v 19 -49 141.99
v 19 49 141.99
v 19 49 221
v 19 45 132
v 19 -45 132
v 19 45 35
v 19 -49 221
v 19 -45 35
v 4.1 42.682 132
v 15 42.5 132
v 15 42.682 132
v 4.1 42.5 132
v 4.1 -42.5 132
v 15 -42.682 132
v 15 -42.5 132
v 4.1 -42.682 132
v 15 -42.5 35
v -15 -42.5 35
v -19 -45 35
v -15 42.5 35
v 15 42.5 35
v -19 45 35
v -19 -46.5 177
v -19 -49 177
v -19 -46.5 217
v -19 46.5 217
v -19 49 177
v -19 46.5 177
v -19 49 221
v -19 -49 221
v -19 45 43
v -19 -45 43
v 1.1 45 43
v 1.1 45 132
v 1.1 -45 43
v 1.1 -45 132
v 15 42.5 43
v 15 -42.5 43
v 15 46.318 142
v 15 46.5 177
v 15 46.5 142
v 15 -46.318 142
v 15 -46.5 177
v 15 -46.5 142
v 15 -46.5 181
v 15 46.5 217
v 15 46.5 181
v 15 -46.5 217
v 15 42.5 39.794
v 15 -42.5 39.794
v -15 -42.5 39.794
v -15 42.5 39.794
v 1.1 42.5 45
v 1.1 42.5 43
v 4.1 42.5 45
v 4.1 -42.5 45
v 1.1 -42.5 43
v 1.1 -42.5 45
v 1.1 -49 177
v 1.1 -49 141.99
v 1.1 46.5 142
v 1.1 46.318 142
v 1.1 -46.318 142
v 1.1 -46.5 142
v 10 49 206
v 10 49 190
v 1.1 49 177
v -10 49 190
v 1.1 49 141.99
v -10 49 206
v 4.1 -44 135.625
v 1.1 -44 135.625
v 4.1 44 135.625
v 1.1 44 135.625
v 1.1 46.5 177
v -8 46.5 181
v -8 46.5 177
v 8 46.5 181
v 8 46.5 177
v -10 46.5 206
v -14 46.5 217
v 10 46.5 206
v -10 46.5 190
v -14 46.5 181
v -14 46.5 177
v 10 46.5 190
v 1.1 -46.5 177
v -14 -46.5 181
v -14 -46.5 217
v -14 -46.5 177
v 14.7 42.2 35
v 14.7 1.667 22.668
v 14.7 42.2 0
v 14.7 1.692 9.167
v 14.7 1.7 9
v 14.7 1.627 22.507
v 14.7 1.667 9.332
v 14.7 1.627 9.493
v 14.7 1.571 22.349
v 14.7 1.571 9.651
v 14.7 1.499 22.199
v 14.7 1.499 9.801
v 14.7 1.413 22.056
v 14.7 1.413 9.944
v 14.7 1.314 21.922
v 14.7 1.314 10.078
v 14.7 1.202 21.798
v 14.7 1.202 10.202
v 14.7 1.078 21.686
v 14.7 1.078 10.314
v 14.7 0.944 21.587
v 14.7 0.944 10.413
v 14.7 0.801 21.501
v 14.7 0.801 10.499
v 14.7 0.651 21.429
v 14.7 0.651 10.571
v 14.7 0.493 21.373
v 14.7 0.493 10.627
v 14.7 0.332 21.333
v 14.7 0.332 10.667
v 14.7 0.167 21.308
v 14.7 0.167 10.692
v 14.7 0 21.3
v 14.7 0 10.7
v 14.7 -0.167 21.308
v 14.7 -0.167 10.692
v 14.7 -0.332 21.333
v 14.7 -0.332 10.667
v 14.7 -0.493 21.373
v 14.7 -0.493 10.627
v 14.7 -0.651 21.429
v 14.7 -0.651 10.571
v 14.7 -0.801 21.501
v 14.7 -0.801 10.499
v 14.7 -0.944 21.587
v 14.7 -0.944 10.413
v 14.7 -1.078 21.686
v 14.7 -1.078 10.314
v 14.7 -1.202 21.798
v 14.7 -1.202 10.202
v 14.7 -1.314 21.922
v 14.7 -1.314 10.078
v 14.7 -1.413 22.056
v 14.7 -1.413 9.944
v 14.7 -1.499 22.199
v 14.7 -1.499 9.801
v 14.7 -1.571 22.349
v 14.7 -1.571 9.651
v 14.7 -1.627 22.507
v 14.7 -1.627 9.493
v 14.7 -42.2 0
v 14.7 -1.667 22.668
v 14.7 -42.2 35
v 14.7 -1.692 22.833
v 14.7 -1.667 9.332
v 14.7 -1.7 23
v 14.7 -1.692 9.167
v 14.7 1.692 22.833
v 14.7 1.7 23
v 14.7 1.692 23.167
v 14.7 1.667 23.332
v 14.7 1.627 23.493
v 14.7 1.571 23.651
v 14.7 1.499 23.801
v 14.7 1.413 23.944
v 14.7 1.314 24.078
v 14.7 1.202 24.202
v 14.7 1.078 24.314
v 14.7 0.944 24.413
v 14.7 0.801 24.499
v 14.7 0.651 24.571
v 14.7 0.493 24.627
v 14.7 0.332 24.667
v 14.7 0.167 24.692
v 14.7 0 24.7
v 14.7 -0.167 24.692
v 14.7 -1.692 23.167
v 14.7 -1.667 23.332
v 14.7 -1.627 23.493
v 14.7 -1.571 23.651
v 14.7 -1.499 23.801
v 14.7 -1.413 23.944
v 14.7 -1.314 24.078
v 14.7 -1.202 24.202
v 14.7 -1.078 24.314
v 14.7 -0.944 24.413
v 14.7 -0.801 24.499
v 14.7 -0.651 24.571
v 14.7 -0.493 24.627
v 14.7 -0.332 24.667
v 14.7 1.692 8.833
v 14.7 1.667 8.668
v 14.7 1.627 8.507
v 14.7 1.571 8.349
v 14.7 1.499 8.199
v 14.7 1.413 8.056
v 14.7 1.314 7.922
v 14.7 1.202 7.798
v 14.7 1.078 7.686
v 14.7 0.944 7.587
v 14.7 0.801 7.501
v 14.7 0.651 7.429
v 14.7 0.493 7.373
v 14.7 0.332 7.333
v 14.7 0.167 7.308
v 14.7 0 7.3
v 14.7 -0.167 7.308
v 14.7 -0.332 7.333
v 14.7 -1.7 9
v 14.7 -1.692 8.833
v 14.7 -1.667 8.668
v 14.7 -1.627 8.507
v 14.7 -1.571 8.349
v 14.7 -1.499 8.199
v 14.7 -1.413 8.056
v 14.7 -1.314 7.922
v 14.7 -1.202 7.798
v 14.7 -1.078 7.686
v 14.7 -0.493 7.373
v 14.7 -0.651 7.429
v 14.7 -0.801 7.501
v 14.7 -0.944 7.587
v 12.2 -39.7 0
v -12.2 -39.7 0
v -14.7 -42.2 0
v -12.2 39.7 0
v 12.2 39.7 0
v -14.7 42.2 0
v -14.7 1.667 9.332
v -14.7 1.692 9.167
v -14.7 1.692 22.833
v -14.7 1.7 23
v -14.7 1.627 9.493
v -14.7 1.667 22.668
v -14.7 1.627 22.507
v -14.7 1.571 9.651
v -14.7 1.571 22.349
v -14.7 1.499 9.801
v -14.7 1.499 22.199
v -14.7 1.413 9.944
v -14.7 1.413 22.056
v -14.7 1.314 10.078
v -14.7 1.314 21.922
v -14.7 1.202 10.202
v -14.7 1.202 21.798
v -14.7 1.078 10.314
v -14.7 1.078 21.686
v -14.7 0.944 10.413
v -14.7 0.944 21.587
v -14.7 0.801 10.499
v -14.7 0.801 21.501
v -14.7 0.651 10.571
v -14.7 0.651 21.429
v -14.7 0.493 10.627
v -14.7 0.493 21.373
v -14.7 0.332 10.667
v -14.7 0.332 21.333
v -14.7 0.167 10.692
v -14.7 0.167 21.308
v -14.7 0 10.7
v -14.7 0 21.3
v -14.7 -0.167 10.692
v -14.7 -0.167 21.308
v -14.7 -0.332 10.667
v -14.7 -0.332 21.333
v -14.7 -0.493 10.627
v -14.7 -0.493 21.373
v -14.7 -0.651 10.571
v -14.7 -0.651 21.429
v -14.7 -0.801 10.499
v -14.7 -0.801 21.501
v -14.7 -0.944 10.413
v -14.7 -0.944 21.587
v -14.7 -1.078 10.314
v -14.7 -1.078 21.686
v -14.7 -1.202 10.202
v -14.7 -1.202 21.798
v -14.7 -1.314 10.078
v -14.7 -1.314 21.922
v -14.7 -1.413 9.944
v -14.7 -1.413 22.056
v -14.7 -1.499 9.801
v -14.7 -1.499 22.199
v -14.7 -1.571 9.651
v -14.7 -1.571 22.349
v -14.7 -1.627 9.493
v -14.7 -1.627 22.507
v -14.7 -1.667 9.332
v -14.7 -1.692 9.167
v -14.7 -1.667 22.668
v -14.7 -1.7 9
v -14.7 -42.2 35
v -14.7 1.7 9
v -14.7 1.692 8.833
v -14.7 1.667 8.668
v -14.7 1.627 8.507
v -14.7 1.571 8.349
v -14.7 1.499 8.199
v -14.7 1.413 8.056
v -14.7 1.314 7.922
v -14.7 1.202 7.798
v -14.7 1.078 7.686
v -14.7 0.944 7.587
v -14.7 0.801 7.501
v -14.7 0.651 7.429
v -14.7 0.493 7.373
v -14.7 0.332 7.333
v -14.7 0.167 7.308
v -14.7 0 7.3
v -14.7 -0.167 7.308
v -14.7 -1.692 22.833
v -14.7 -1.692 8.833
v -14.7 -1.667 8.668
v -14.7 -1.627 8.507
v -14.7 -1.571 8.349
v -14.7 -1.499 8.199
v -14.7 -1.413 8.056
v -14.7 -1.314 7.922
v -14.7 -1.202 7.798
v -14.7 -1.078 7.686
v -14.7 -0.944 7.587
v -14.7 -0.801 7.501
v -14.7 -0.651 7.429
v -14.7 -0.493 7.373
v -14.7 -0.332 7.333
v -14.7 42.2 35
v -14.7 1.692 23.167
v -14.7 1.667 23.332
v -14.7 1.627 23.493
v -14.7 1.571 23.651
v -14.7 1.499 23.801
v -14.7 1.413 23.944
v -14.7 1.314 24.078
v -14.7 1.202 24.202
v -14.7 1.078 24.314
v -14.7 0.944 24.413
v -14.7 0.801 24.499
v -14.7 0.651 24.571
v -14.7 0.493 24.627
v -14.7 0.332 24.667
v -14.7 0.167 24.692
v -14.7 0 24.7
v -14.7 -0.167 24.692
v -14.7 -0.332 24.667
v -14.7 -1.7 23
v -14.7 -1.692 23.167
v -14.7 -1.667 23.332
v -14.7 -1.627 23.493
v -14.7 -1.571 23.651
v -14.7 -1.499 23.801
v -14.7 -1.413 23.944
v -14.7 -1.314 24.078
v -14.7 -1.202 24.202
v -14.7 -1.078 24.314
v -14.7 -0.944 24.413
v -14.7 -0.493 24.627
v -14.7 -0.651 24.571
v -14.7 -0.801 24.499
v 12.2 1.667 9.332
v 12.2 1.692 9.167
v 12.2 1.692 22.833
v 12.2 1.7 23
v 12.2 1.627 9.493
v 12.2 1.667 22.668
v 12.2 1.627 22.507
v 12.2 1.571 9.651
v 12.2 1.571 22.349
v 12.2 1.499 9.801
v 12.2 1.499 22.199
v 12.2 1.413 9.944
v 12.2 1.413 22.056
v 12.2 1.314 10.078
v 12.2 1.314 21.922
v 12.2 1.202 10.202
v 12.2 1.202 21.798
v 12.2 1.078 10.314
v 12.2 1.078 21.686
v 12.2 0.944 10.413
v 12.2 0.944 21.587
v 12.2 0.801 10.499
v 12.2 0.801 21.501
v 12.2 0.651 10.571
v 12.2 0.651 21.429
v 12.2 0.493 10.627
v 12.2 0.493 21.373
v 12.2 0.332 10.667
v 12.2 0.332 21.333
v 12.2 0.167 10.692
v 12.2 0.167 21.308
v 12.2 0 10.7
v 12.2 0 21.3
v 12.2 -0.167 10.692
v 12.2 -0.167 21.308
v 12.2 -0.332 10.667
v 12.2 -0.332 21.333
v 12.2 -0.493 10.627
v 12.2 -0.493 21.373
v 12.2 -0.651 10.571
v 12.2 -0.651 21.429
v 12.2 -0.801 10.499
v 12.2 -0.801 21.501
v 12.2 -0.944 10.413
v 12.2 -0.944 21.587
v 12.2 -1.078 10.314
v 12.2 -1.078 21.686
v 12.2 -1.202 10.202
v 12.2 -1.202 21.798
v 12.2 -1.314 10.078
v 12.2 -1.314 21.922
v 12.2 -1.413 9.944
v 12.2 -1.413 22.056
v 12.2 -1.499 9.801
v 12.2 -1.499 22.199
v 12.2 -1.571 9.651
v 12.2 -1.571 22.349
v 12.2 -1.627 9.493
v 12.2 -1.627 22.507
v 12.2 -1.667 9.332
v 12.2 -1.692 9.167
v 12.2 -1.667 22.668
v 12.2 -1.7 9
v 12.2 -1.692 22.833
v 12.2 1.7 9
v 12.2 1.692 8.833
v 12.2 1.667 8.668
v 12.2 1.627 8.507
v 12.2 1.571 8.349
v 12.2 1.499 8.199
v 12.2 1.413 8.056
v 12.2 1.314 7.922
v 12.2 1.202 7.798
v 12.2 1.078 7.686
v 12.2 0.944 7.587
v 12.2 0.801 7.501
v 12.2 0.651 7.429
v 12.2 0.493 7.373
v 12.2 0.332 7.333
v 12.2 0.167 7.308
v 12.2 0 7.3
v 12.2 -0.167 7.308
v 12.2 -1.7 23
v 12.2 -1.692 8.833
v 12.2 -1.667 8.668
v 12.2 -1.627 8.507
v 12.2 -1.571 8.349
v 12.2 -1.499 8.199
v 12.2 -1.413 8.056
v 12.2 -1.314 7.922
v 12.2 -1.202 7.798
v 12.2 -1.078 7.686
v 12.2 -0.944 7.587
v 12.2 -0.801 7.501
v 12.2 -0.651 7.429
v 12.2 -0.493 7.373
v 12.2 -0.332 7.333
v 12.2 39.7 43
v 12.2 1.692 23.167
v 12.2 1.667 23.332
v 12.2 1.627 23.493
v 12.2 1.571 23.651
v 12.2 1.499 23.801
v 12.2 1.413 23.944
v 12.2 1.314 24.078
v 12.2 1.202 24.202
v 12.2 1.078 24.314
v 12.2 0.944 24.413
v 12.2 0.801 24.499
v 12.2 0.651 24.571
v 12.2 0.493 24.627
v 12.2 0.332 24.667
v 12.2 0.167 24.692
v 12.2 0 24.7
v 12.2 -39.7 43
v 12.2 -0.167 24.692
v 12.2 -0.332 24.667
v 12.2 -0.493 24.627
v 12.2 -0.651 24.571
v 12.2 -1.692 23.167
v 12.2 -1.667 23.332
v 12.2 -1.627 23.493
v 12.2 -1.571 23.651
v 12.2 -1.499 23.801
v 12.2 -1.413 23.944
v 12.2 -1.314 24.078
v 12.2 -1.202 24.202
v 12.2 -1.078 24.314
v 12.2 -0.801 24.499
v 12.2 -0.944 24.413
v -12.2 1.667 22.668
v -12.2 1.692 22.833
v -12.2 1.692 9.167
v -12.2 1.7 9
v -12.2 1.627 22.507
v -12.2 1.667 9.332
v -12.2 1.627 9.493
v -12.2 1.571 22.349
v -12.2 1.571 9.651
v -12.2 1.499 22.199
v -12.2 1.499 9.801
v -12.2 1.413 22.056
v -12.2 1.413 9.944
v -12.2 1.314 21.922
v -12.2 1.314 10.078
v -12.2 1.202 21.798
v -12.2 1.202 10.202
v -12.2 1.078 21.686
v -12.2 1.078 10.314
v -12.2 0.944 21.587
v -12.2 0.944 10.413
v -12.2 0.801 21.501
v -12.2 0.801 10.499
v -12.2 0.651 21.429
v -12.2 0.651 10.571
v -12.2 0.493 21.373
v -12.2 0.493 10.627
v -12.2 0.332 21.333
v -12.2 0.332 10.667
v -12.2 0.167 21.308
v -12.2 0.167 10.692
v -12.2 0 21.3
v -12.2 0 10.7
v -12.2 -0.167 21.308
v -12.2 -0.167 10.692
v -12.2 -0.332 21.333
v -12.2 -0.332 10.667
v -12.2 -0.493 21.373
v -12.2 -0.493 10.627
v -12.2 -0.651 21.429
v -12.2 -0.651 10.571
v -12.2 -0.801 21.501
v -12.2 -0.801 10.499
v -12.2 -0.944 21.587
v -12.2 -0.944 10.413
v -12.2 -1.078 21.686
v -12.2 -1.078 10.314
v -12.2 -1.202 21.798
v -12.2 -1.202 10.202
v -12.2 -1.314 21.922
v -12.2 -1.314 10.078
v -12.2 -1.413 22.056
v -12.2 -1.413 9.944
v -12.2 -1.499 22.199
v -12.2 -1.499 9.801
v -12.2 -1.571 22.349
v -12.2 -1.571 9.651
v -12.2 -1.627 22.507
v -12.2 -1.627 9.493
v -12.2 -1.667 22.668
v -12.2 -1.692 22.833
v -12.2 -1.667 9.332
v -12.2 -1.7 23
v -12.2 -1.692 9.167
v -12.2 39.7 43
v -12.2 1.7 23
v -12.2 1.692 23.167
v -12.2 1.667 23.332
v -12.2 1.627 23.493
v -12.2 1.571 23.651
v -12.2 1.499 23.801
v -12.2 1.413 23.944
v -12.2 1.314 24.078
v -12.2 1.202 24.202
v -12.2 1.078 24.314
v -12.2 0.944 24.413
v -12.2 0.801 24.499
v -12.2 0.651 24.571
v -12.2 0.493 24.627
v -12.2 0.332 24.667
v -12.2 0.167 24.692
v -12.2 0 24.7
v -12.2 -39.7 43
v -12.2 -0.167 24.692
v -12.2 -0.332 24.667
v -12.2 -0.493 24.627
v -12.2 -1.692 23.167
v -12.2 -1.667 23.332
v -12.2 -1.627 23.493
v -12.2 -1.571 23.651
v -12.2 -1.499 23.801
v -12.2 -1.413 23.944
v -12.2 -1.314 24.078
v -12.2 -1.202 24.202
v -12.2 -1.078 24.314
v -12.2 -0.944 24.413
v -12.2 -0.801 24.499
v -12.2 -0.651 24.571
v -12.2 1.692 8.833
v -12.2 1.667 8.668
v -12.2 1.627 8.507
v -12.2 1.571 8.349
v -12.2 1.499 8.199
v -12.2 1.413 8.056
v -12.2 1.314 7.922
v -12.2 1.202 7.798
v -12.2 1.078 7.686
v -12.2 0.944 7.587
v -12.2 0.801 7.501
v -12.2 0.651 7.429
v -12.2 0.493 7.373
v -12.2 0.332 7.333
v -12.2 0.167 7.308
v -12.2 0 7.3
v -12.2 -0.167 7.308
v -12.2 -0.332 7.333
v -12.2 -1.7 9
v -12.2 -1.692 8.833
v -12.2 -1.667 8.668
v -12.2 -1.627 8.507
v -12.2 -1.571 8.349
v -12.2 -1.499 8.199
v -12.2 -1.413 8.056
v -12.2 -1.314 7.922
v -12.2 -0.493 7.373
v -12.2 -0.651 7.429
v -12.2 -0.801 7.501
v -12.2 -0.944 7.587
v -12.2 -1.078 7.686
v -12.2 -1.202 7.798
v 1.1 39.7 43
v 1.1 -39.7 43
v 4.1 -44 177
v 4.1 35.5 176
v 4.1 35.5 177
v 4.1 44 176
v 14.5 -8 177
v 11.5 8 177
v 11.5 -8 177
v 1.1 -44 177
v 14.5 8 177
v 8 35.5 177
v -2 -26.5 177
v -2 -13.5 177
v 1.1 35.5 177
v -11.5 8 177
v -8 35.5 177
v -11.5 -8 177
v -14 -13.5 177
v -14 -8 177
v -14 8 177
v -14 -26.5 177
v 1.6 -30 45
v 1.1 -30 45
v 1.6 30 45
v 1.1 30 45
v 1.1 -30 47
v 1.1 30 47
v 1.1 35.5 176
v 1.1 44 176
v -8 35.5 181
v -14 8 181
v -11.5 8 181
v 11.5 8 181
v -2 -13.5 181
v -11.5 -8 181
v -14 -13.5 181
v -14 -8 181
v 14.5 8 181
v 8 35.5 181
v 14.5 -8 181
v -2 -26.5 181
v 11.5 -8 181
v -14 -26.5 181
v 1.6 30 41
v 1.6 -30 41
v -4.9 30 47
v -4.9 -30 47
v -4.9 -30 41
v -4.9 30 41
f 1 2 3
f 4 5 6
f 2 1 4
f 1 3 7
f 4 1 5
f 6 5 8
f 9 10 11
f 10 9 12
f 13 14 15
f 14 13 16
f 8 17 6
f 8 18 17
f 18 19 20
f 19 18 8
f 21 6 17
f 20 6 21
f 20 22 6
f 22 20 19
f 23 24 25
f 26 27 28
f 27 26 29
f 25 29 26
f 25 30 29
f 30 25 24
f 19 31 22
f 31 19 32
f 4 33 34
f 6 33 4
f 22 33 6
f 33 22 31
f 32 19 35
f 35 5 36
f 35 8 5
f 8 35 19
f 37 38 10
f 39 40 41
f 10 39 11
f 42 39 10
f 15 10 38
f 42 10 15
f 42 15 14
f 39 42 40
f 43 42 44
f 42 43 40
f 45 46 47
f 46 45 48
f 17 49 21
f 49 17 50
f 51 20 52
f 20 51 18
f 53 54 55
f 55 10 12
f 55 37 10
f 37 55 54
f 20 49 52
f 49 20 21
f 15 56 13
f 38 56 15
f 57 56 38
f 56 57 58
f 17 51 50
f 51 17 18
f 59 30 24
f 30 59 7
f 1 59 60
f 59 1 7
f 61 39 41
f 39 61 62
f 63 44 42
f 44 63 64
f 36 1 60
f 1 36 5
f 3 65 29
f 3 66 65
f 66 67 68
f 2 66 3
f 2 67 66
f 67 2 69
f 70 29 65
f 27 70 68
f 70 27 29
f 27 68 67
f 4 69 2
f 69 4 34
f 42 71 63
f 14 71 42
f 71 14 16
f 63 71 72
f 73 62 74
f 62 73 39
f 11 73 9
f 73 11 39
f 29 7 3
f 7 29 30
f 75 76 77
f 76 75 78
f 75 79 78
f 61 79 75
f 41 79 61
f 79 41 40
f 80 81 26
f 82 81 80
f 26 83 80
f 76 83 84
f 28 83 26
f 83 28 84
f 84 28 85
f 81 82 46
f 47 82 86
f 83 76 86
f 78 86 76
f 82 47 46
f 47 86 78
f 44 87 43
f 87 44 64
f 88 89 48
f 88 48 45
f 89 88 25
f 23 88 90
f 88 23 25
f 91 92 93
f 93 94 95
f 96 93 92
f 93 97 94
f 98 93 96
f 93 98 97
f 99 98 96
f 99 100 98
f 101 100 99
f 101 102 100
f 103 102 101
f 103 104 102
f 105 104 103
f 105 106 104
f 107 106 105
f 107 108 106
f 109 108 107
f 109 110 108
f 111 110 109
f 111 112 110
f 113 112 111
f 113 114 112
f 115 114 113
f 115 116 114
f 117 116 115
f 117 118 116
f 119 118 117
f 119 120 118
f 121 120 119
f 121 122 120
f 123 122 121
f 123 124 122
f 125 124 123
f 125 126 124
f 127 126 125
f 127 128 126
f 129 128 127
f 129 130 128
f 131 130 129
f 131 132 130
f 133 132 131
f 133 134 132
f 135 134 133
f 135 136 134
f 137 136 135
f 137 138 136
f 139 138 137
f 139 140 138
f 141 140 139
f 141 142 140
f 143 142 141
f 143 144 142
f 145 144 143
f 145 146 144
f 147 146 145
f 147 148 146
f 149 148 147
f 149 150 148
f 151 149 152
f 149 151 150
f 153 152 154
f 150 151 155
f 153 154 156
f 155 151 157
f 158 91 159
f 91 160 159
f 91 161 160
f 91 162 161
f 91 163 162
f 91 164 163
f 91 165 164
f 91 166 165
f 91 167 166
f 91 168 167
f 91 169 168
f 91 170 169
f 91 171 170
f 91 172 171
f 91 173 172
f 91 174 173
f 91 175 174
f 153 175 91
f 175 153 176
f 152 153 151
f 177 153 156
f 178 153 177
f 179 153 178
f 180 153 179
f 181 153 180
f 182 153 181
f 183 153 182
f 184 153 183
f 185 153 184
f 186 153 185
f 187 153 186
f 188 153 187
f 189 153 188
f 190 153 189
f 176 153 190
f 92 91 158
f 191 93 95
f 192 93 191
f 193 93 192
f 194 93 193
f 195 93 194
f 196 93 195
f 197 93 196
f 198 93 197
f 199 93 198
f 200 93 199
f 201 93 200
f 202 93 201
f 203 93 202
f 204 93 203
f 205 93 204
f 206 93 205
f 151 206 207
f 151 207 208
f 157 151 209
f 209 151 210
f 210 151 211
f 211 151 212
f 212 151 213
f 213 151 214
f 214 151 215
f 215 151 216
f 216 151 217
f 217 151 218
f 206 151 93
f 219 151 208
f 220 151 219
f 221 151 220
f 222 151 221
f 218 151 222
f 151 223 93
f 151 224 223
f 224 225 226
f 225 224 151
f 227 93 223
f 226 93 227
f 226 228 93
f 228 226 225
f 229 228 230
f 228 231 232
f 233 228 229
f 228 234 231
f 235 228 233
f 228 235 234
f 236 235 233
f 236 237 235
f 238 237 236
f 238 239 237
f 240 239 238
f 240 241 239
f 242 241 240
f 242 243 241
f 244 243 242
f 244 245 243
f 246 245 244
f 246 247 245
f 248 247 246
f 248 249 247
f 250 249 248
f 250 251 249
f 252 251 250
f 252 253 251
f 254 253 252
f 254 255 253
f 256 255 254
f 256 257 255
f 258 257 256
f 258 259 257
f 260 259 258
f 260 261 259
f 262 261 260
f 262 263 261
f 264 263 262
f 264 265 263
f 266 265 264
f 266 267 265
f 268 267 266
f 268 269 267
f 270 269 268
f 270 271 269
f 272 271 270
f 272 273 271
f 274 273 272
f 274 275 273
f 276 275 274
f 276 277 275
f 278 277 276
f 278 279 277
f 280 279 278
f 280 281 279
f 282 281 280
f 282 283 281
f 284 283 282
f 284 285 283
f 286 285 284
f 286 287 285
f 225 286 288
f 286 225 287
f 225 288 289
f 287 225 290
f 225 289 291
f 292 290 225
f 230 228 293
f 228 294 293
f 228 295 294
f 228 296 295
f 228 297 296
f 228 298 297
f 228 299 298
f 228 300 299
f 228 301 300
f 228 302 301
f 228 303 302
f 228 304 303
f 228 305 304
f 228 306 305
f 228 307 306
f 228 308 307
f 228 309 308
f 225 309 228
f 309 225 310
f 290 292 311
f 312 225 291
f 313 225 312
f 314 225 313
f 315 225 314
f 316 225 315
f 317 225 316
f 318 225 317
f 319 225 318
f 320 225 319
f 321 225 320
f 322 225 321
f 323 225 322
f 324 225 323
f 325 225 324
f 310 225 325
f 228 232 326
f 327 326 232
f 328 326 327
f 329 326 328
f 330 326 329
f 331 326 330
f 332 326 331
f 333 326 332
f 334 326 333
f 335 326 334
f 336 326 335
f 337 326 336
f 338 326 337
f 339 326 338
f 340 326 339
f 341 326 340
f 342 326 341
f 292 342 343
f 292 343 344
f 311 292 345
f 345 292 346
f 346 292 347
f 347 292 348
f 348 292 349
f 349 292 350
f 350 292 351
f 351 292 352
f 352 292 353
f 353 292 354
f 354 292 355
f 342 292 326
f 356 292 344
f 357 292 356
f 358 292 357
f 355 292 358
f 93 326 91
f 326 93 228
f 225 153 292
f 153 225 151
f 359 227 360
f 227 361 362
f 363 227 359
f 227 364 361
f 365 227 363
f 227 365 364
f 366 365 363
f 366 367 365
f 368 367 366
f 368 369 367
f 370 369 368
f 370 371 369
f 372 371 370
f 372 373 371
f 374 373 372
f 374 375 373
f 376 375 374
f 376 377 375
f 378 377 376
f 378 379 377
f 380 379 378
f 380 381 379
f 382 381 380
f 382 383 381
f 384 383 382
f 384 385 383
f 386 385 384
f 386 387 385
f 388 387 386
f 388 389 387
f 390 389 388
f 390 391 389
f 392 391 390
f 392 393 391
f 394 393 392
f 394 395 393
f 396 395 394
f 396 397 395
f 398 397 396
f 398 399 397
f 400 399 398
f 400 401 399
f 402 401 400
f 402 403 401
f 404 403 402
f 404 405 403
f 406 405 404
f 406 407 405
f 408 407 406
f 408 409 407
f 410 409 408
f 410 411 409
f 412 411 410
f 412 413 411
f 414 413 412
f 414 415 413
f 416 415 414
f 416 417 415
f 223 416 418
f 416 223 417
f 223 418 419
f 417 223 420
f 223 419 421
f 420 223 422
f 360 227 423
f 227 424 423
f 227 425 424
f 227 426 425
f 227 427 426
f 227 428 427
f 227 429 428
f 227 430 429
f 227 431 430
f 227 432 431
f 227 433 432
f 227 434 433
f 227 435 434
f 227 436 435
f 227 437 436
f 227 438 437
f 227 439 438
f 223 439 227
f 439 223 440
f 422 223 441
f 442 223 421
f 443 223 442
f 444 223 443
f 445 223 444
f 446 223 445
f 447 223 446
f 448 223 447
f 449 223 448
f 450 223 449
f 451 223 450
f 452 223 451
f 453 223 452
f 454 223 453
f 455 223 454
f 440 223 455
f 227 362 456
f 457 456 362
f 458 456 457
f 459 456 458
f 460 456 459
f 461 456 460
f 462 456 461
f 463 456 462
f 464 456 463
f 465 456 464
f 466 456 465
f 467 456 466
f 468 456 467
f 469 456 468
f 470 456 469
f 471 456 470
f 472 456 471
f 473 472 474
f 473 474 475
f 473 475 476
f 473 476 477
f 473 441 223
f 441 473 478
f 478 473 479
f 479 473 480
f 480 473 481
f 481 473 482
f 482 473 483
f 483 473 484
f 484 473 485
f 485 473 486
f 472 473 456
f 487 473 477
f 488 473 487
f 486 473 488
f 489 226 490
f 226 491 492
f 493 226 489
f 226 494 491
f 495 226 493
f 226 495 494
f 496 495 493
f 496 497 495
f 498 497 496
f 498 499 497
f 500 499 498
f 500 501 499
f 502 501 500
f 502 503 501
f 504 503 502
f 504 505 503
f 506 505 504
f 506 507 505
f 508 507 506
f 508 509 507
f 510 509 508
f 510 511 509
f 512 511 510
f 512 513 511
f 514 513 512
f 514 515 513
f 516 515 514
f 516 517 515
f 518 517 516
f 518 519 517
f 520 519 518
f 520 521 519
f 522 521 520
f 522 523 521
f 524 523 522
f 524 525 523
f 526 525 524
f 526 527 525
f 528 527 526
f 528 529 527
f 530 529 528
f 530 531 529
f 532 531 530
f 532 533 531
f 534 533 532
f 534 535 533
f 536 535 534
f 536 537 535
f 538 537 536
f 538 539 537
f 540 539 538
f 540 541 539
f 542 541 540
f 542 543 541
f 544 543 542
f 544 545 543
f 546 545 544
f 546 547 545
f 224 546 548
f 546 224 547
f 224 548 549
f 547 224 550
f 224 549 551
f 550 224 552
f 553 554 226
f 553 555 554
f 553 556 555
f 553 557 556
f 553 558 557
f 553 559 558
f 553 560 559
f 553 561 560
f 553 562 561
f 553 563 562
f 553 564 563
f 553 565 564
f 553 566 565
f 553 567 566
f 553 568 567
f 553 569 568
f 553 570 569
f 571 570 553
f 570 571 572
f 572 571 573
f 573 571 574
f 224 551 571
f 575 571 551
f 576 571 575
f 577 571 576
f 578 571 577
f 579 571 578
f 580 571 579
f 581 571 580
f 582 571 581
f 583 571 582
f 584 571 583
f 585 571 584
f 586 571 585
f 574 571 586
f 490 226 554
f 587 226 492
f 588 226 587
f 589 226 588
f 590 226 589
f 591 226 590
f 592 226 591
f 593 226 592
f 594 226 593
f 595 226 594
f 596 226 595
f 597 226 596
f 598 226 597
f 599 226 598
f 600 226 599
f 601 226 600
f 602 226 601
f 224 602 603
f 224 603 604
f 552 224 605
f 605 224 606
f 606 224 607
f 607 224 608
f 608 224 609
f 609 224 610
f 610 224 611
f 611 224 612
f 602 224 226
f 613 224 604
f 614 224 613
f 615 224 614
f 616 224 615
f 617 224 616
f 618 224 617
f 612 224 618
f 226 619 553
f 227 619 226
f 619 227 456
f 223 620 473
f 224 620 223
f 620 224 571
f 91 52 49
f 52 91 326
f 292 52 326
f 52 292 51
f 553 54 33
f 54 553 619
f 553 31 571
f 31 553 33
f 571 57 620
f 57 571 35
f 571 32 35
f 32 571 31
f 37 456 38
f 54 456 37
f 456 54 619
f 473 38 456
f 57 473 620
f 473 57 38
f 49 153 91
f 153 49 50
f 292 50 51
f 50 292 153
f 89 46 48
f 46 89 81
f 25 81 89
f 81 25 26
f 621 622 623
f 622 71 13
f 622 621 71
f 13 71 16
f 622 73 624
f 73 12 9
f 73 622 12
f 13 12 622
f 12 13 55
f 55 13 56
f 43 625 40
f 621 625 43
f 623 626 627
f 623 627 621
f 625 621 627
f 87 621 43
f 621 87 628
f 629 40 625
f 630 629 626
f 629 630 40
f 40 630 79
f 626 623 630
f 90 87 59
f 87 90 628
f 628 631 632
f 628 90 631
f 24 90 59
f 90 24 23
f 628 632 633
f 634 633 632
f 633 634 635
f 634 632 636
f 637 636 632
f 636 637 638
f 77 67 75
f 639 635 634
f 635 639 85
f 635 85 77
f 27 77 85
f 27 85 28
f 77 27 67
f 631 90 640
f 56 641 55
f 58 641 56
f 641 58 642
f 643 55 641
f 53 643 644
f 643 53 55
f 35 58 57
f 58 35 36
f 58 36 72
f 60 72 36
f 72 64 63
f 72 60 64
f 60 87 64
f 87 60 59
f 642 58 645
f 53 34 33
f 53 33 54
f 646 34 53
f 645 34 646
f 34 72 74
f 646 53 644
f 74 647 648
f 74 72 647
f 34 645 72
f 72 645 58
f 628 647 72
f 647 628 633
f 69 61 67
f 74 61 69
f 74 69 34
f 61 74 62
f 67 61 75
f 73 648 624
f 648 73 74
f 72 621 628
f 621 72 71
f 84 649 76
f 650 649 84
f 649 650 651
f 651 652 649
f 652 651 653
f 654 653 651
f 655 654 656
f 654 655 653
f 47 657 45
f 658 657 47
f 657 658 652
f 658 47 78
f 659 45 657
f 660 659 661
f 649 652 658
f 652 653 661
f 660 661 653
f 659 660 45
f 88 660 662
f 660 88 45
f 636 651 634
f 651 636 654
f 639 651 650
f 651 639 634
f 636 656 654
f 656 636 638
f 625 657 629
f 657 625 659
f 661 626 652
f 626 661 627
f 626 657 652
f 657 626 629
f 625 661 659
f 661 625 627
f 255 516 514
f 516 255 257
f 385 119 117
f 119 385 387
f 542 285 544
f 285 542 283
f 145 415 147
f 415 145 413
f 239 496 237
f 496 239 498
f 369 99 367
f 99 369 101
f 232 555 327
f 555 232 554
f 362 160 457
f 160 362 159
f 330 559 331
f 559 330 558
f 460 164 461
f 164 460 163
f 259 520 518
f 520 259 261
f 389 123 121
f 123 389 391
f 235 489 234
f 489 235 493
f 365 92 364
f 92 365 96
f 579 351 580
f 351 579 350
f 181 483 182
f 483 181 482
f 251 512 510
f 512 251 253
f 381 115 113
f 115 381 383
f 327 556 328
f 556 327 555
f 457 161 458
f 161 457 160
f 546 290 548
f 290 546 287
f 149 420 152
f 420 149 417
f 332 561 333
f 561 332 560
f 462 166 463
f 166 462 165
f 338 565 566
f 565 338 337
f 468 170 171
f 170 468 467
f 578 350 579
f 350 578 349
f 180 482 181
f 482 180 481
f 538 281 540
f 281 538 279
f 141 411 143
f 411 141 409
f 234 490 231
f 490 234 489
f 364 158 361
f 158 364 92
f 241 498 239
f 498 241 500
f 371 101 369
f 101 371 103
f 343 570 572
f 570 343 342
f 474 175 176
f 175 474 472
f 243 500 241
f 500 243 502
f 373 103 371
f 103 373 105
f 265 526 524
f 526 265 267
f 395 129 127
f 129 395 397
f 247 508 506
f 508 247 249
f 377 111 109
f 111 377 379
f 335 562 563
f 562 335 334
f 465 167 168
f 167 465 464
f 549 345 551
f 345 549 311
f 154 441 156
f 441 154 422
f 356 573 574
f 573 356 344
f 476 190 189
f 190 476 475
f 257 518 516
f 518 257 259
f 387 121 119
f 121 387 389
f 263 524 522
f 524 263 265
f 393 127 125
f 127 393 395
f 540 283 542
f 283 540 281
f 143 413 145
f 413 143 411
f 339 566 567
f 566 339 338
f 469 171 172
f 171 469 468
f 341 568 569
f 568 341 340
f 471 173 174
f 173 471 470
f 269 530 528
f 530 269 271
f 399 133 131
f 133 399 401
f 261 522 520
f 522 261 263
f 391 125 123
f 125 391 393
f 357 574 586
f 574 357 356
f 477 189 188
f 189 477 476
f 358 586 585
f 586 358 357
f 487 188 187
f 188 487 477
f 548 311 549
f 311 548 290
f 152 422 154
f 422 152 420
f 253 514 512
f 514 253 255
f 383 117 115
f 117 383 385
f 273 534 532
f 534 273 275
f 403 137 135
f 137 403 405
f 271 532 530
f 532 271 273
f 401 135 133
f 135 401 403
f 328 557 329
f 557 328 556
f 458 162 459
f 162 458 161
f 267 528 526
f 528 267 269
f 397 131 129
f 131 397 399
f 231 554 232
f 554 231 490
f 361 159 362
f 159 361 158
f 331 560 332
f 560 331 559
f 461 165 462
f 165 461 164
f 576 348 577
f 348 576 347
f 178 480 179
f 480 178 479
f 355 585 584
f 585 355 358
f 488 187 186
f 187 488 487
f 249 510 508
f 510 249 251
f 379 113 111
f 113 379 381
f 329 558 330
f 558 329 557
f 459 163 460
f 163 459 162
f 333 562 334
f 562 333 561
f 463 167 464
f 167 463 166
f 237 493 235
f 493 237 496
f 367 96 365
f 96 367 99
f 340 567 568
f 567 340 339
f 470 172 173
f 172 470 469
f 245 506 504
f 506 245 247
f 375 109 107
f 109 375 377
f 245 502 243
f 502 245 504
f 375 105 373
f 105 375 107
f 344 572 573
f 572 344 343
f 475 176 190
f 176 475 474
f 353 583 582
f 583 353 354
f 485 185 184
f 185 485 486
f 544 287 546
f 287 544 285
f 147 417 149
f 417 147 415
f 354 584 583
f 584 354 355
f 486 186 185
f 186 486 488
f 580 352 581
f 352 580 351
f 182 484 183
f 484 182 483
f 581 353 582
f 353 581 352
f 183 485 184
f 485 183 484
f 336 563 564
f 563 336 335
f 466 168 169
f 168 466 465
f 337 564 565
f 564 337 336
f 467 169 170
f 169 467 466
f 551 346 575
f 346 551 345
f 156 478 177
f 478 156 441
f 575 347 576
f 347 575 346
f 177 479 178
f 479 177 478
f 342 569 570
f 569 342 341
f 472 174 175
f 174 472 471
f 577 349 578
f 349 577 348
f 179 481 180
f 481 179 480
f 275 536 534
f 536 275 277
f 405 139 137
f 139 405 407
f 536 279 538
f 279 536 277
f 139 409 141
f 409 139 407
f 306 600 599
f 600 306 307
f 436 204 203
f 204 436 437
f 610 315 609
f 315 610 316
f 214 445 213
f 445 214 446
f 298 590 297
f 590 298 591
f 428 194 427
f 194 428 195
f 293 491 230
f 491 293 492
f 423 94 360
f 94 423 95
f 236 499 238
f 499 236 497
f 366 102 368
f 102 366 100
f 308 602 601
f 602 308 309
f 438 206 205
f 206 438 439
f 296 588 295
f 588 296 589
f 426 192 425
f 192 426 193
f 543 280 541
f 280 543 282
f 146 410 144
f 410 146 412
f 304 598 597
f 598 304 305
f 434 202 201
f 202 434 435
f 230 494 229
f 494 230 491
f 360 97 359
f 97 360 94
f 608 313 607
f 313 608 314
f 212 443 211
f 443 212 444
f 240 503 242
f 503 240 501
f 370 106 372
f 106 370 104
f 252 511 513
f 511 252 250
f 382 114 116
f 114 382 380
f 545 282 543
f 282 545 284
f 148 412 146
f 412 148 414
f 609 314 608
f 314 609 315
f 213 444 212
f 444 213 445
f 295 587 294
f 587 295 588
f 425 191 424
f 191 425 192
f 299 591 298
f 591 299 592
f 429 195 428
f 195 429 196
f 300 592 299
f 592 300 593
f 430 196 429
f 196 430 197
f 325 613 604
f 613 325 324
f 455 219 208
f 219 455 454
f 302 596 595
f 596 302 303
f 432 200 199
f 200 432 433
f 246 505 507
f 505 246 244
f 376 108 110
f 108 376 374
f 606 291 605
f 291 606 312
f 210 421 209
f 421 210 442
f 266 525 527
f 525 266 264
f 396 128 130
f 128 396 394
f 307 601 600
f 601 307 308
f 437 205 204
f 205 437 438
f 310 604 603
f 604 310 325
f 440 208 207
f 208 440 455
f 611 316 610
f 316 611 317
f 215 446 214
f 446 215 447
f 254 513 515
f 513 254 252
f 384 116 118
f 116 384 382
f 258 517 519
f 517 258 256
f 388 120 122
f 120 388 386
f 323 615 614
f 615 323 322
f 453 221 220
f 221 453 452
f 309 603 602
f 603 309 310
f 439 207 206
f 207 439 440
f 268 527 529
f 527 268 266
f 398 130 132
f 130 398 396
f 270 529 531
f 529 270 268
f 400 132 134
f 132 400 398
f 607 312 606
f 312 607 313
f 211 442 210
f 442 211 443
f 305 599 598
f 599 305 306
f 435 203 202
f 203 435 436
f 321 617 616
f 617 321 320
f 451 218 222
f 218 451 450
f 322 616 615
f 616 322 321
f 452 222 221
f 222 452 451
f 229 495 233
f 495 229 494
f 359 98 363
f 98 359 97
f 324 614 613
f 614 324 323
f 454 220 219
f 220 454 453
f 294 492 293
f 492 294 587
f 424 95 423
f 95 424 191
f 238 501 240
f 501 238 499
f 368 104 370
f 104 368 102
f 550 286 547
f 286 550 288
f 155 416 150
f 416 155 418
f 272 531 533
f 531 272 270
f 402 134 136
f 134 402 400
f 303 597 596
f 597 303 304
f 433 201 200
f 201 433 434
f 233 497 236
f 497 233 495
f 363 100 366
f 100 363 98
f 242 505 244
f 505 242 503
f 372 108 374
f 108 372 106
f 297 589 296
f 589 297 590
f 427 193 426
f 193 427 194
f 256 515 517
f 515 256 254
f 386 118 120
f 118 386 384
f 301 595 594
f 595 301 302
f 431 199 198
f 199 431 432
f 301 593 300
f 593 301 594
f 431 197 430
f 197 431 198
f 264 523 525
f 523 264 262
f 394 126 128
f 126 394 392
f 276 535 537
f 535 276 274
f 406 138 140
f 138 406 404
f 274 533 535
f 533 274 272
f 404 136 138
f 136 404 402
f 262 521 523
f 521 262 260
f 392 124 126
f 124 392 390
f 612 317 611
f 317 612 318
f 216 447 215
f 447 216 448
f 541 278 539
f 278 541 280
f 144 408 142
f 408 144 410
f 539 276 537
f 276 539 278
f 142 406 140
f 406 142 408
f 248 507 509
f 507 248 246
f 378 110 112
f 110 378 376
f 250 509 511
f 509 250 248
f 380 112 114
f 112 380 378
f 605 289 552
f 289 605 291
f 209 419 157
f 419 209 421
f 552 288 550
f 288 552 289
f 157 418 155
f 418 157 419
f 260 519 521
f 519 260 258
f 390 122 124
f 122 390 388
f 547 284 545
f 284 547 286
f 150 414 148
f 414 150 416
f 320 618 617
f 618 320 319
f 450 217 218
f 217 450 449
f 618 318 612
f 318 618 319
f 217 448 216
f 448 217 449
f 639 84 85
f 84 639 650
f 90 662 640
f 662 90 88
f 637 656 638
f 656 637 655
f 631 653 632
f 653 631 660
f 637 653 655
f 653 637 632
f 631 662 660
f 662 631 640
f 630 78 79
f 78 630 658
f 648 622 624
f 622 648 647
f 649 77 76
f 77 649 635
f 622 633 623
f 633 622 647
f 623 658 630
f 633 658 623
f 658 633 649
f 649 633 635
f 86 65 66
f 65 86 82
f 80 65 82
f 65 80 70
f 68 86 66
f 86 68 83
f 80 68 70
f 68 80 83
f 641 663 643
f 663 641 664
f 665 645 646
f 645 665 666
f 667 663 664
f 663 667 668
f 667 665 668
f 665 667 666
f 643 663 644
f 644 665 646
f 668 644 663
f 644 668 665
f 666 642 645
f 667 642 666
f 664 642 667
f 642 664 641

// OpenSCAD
// Standalone robot upper body B piece (upper_bodyB v5.4) - A/B-final
// equipment bay, DOOR RETIRED. Changes vs v5.3 (2026-07-25):
//   - THREE-SIDE OPEN BAY below the battery shelf (cable face
//     MAXIMIZED, user request): v5.3 removed the return lips for a
//     full-width X- opening (85/93), but the Y walls still sat only
//     5 mm off the 75 board's side edges - the OpenCR's IN-PLANE edge
//     connectors (power cable, micro-USB, switch) had no straight
//     lateral plug path. v5.4 removes EVERYTHING in front of the
//     bulkhead plane (x < bulk_x0) over the whole bay height: the X-
//     wall AND both Y-wall front strips. The board zone is open on
//     X-, Y- and Y+; every edge connector gets a straight,
//     unobstructed plug/cable path. The battery zone above the shelf
//     keeps the v5.3 full-width X- opening (93, no lips).
//   - Structure: the bulkhead (welded into both Y walls) + the rear
//     Y-wall strips + the full X+ wall form a CLOSED rear torsion
//     cell over the bay height - stiffer than the v5.2 lipped
//     C-section (the bulkhead was the main stiffener all along).
//     The seating ledge is the one part still protruding in front of
//     the bulkhead plane.
//   - Unchanged: overall height (robot_l2 372, piece ~221 tall),
//     ocr_center_z / ELL_IMU, tape pad + bottom ledge mount, closed
//     telescoping sleeve splice, shelf-front toggle slot ((*) measure
//     the real switch), 25 mm cable room over the board top.
// Print UPRIGHT as placed, sleeve down (~221 tall - fits X1C 256 with
// margin); the battery shelf bridges/cantilevers over the open bay -
// allow bridging or a little support through the open face.
// Edit shared dimensions in frame_master.scad so the assembly stays linked.

part_mode = "upper_body_b";
part_cutaway = false;     // true removes a corner quarter (bulkhead, tape
                          // pad, seating ledge and battery shelf visible) -
                          // rarely needed now, the bay is open on 3 sides.
                          // Set back to false before exporting the STL!
print_export = true;      // use high quality $fn for STL export

include <frame_master.scad>
